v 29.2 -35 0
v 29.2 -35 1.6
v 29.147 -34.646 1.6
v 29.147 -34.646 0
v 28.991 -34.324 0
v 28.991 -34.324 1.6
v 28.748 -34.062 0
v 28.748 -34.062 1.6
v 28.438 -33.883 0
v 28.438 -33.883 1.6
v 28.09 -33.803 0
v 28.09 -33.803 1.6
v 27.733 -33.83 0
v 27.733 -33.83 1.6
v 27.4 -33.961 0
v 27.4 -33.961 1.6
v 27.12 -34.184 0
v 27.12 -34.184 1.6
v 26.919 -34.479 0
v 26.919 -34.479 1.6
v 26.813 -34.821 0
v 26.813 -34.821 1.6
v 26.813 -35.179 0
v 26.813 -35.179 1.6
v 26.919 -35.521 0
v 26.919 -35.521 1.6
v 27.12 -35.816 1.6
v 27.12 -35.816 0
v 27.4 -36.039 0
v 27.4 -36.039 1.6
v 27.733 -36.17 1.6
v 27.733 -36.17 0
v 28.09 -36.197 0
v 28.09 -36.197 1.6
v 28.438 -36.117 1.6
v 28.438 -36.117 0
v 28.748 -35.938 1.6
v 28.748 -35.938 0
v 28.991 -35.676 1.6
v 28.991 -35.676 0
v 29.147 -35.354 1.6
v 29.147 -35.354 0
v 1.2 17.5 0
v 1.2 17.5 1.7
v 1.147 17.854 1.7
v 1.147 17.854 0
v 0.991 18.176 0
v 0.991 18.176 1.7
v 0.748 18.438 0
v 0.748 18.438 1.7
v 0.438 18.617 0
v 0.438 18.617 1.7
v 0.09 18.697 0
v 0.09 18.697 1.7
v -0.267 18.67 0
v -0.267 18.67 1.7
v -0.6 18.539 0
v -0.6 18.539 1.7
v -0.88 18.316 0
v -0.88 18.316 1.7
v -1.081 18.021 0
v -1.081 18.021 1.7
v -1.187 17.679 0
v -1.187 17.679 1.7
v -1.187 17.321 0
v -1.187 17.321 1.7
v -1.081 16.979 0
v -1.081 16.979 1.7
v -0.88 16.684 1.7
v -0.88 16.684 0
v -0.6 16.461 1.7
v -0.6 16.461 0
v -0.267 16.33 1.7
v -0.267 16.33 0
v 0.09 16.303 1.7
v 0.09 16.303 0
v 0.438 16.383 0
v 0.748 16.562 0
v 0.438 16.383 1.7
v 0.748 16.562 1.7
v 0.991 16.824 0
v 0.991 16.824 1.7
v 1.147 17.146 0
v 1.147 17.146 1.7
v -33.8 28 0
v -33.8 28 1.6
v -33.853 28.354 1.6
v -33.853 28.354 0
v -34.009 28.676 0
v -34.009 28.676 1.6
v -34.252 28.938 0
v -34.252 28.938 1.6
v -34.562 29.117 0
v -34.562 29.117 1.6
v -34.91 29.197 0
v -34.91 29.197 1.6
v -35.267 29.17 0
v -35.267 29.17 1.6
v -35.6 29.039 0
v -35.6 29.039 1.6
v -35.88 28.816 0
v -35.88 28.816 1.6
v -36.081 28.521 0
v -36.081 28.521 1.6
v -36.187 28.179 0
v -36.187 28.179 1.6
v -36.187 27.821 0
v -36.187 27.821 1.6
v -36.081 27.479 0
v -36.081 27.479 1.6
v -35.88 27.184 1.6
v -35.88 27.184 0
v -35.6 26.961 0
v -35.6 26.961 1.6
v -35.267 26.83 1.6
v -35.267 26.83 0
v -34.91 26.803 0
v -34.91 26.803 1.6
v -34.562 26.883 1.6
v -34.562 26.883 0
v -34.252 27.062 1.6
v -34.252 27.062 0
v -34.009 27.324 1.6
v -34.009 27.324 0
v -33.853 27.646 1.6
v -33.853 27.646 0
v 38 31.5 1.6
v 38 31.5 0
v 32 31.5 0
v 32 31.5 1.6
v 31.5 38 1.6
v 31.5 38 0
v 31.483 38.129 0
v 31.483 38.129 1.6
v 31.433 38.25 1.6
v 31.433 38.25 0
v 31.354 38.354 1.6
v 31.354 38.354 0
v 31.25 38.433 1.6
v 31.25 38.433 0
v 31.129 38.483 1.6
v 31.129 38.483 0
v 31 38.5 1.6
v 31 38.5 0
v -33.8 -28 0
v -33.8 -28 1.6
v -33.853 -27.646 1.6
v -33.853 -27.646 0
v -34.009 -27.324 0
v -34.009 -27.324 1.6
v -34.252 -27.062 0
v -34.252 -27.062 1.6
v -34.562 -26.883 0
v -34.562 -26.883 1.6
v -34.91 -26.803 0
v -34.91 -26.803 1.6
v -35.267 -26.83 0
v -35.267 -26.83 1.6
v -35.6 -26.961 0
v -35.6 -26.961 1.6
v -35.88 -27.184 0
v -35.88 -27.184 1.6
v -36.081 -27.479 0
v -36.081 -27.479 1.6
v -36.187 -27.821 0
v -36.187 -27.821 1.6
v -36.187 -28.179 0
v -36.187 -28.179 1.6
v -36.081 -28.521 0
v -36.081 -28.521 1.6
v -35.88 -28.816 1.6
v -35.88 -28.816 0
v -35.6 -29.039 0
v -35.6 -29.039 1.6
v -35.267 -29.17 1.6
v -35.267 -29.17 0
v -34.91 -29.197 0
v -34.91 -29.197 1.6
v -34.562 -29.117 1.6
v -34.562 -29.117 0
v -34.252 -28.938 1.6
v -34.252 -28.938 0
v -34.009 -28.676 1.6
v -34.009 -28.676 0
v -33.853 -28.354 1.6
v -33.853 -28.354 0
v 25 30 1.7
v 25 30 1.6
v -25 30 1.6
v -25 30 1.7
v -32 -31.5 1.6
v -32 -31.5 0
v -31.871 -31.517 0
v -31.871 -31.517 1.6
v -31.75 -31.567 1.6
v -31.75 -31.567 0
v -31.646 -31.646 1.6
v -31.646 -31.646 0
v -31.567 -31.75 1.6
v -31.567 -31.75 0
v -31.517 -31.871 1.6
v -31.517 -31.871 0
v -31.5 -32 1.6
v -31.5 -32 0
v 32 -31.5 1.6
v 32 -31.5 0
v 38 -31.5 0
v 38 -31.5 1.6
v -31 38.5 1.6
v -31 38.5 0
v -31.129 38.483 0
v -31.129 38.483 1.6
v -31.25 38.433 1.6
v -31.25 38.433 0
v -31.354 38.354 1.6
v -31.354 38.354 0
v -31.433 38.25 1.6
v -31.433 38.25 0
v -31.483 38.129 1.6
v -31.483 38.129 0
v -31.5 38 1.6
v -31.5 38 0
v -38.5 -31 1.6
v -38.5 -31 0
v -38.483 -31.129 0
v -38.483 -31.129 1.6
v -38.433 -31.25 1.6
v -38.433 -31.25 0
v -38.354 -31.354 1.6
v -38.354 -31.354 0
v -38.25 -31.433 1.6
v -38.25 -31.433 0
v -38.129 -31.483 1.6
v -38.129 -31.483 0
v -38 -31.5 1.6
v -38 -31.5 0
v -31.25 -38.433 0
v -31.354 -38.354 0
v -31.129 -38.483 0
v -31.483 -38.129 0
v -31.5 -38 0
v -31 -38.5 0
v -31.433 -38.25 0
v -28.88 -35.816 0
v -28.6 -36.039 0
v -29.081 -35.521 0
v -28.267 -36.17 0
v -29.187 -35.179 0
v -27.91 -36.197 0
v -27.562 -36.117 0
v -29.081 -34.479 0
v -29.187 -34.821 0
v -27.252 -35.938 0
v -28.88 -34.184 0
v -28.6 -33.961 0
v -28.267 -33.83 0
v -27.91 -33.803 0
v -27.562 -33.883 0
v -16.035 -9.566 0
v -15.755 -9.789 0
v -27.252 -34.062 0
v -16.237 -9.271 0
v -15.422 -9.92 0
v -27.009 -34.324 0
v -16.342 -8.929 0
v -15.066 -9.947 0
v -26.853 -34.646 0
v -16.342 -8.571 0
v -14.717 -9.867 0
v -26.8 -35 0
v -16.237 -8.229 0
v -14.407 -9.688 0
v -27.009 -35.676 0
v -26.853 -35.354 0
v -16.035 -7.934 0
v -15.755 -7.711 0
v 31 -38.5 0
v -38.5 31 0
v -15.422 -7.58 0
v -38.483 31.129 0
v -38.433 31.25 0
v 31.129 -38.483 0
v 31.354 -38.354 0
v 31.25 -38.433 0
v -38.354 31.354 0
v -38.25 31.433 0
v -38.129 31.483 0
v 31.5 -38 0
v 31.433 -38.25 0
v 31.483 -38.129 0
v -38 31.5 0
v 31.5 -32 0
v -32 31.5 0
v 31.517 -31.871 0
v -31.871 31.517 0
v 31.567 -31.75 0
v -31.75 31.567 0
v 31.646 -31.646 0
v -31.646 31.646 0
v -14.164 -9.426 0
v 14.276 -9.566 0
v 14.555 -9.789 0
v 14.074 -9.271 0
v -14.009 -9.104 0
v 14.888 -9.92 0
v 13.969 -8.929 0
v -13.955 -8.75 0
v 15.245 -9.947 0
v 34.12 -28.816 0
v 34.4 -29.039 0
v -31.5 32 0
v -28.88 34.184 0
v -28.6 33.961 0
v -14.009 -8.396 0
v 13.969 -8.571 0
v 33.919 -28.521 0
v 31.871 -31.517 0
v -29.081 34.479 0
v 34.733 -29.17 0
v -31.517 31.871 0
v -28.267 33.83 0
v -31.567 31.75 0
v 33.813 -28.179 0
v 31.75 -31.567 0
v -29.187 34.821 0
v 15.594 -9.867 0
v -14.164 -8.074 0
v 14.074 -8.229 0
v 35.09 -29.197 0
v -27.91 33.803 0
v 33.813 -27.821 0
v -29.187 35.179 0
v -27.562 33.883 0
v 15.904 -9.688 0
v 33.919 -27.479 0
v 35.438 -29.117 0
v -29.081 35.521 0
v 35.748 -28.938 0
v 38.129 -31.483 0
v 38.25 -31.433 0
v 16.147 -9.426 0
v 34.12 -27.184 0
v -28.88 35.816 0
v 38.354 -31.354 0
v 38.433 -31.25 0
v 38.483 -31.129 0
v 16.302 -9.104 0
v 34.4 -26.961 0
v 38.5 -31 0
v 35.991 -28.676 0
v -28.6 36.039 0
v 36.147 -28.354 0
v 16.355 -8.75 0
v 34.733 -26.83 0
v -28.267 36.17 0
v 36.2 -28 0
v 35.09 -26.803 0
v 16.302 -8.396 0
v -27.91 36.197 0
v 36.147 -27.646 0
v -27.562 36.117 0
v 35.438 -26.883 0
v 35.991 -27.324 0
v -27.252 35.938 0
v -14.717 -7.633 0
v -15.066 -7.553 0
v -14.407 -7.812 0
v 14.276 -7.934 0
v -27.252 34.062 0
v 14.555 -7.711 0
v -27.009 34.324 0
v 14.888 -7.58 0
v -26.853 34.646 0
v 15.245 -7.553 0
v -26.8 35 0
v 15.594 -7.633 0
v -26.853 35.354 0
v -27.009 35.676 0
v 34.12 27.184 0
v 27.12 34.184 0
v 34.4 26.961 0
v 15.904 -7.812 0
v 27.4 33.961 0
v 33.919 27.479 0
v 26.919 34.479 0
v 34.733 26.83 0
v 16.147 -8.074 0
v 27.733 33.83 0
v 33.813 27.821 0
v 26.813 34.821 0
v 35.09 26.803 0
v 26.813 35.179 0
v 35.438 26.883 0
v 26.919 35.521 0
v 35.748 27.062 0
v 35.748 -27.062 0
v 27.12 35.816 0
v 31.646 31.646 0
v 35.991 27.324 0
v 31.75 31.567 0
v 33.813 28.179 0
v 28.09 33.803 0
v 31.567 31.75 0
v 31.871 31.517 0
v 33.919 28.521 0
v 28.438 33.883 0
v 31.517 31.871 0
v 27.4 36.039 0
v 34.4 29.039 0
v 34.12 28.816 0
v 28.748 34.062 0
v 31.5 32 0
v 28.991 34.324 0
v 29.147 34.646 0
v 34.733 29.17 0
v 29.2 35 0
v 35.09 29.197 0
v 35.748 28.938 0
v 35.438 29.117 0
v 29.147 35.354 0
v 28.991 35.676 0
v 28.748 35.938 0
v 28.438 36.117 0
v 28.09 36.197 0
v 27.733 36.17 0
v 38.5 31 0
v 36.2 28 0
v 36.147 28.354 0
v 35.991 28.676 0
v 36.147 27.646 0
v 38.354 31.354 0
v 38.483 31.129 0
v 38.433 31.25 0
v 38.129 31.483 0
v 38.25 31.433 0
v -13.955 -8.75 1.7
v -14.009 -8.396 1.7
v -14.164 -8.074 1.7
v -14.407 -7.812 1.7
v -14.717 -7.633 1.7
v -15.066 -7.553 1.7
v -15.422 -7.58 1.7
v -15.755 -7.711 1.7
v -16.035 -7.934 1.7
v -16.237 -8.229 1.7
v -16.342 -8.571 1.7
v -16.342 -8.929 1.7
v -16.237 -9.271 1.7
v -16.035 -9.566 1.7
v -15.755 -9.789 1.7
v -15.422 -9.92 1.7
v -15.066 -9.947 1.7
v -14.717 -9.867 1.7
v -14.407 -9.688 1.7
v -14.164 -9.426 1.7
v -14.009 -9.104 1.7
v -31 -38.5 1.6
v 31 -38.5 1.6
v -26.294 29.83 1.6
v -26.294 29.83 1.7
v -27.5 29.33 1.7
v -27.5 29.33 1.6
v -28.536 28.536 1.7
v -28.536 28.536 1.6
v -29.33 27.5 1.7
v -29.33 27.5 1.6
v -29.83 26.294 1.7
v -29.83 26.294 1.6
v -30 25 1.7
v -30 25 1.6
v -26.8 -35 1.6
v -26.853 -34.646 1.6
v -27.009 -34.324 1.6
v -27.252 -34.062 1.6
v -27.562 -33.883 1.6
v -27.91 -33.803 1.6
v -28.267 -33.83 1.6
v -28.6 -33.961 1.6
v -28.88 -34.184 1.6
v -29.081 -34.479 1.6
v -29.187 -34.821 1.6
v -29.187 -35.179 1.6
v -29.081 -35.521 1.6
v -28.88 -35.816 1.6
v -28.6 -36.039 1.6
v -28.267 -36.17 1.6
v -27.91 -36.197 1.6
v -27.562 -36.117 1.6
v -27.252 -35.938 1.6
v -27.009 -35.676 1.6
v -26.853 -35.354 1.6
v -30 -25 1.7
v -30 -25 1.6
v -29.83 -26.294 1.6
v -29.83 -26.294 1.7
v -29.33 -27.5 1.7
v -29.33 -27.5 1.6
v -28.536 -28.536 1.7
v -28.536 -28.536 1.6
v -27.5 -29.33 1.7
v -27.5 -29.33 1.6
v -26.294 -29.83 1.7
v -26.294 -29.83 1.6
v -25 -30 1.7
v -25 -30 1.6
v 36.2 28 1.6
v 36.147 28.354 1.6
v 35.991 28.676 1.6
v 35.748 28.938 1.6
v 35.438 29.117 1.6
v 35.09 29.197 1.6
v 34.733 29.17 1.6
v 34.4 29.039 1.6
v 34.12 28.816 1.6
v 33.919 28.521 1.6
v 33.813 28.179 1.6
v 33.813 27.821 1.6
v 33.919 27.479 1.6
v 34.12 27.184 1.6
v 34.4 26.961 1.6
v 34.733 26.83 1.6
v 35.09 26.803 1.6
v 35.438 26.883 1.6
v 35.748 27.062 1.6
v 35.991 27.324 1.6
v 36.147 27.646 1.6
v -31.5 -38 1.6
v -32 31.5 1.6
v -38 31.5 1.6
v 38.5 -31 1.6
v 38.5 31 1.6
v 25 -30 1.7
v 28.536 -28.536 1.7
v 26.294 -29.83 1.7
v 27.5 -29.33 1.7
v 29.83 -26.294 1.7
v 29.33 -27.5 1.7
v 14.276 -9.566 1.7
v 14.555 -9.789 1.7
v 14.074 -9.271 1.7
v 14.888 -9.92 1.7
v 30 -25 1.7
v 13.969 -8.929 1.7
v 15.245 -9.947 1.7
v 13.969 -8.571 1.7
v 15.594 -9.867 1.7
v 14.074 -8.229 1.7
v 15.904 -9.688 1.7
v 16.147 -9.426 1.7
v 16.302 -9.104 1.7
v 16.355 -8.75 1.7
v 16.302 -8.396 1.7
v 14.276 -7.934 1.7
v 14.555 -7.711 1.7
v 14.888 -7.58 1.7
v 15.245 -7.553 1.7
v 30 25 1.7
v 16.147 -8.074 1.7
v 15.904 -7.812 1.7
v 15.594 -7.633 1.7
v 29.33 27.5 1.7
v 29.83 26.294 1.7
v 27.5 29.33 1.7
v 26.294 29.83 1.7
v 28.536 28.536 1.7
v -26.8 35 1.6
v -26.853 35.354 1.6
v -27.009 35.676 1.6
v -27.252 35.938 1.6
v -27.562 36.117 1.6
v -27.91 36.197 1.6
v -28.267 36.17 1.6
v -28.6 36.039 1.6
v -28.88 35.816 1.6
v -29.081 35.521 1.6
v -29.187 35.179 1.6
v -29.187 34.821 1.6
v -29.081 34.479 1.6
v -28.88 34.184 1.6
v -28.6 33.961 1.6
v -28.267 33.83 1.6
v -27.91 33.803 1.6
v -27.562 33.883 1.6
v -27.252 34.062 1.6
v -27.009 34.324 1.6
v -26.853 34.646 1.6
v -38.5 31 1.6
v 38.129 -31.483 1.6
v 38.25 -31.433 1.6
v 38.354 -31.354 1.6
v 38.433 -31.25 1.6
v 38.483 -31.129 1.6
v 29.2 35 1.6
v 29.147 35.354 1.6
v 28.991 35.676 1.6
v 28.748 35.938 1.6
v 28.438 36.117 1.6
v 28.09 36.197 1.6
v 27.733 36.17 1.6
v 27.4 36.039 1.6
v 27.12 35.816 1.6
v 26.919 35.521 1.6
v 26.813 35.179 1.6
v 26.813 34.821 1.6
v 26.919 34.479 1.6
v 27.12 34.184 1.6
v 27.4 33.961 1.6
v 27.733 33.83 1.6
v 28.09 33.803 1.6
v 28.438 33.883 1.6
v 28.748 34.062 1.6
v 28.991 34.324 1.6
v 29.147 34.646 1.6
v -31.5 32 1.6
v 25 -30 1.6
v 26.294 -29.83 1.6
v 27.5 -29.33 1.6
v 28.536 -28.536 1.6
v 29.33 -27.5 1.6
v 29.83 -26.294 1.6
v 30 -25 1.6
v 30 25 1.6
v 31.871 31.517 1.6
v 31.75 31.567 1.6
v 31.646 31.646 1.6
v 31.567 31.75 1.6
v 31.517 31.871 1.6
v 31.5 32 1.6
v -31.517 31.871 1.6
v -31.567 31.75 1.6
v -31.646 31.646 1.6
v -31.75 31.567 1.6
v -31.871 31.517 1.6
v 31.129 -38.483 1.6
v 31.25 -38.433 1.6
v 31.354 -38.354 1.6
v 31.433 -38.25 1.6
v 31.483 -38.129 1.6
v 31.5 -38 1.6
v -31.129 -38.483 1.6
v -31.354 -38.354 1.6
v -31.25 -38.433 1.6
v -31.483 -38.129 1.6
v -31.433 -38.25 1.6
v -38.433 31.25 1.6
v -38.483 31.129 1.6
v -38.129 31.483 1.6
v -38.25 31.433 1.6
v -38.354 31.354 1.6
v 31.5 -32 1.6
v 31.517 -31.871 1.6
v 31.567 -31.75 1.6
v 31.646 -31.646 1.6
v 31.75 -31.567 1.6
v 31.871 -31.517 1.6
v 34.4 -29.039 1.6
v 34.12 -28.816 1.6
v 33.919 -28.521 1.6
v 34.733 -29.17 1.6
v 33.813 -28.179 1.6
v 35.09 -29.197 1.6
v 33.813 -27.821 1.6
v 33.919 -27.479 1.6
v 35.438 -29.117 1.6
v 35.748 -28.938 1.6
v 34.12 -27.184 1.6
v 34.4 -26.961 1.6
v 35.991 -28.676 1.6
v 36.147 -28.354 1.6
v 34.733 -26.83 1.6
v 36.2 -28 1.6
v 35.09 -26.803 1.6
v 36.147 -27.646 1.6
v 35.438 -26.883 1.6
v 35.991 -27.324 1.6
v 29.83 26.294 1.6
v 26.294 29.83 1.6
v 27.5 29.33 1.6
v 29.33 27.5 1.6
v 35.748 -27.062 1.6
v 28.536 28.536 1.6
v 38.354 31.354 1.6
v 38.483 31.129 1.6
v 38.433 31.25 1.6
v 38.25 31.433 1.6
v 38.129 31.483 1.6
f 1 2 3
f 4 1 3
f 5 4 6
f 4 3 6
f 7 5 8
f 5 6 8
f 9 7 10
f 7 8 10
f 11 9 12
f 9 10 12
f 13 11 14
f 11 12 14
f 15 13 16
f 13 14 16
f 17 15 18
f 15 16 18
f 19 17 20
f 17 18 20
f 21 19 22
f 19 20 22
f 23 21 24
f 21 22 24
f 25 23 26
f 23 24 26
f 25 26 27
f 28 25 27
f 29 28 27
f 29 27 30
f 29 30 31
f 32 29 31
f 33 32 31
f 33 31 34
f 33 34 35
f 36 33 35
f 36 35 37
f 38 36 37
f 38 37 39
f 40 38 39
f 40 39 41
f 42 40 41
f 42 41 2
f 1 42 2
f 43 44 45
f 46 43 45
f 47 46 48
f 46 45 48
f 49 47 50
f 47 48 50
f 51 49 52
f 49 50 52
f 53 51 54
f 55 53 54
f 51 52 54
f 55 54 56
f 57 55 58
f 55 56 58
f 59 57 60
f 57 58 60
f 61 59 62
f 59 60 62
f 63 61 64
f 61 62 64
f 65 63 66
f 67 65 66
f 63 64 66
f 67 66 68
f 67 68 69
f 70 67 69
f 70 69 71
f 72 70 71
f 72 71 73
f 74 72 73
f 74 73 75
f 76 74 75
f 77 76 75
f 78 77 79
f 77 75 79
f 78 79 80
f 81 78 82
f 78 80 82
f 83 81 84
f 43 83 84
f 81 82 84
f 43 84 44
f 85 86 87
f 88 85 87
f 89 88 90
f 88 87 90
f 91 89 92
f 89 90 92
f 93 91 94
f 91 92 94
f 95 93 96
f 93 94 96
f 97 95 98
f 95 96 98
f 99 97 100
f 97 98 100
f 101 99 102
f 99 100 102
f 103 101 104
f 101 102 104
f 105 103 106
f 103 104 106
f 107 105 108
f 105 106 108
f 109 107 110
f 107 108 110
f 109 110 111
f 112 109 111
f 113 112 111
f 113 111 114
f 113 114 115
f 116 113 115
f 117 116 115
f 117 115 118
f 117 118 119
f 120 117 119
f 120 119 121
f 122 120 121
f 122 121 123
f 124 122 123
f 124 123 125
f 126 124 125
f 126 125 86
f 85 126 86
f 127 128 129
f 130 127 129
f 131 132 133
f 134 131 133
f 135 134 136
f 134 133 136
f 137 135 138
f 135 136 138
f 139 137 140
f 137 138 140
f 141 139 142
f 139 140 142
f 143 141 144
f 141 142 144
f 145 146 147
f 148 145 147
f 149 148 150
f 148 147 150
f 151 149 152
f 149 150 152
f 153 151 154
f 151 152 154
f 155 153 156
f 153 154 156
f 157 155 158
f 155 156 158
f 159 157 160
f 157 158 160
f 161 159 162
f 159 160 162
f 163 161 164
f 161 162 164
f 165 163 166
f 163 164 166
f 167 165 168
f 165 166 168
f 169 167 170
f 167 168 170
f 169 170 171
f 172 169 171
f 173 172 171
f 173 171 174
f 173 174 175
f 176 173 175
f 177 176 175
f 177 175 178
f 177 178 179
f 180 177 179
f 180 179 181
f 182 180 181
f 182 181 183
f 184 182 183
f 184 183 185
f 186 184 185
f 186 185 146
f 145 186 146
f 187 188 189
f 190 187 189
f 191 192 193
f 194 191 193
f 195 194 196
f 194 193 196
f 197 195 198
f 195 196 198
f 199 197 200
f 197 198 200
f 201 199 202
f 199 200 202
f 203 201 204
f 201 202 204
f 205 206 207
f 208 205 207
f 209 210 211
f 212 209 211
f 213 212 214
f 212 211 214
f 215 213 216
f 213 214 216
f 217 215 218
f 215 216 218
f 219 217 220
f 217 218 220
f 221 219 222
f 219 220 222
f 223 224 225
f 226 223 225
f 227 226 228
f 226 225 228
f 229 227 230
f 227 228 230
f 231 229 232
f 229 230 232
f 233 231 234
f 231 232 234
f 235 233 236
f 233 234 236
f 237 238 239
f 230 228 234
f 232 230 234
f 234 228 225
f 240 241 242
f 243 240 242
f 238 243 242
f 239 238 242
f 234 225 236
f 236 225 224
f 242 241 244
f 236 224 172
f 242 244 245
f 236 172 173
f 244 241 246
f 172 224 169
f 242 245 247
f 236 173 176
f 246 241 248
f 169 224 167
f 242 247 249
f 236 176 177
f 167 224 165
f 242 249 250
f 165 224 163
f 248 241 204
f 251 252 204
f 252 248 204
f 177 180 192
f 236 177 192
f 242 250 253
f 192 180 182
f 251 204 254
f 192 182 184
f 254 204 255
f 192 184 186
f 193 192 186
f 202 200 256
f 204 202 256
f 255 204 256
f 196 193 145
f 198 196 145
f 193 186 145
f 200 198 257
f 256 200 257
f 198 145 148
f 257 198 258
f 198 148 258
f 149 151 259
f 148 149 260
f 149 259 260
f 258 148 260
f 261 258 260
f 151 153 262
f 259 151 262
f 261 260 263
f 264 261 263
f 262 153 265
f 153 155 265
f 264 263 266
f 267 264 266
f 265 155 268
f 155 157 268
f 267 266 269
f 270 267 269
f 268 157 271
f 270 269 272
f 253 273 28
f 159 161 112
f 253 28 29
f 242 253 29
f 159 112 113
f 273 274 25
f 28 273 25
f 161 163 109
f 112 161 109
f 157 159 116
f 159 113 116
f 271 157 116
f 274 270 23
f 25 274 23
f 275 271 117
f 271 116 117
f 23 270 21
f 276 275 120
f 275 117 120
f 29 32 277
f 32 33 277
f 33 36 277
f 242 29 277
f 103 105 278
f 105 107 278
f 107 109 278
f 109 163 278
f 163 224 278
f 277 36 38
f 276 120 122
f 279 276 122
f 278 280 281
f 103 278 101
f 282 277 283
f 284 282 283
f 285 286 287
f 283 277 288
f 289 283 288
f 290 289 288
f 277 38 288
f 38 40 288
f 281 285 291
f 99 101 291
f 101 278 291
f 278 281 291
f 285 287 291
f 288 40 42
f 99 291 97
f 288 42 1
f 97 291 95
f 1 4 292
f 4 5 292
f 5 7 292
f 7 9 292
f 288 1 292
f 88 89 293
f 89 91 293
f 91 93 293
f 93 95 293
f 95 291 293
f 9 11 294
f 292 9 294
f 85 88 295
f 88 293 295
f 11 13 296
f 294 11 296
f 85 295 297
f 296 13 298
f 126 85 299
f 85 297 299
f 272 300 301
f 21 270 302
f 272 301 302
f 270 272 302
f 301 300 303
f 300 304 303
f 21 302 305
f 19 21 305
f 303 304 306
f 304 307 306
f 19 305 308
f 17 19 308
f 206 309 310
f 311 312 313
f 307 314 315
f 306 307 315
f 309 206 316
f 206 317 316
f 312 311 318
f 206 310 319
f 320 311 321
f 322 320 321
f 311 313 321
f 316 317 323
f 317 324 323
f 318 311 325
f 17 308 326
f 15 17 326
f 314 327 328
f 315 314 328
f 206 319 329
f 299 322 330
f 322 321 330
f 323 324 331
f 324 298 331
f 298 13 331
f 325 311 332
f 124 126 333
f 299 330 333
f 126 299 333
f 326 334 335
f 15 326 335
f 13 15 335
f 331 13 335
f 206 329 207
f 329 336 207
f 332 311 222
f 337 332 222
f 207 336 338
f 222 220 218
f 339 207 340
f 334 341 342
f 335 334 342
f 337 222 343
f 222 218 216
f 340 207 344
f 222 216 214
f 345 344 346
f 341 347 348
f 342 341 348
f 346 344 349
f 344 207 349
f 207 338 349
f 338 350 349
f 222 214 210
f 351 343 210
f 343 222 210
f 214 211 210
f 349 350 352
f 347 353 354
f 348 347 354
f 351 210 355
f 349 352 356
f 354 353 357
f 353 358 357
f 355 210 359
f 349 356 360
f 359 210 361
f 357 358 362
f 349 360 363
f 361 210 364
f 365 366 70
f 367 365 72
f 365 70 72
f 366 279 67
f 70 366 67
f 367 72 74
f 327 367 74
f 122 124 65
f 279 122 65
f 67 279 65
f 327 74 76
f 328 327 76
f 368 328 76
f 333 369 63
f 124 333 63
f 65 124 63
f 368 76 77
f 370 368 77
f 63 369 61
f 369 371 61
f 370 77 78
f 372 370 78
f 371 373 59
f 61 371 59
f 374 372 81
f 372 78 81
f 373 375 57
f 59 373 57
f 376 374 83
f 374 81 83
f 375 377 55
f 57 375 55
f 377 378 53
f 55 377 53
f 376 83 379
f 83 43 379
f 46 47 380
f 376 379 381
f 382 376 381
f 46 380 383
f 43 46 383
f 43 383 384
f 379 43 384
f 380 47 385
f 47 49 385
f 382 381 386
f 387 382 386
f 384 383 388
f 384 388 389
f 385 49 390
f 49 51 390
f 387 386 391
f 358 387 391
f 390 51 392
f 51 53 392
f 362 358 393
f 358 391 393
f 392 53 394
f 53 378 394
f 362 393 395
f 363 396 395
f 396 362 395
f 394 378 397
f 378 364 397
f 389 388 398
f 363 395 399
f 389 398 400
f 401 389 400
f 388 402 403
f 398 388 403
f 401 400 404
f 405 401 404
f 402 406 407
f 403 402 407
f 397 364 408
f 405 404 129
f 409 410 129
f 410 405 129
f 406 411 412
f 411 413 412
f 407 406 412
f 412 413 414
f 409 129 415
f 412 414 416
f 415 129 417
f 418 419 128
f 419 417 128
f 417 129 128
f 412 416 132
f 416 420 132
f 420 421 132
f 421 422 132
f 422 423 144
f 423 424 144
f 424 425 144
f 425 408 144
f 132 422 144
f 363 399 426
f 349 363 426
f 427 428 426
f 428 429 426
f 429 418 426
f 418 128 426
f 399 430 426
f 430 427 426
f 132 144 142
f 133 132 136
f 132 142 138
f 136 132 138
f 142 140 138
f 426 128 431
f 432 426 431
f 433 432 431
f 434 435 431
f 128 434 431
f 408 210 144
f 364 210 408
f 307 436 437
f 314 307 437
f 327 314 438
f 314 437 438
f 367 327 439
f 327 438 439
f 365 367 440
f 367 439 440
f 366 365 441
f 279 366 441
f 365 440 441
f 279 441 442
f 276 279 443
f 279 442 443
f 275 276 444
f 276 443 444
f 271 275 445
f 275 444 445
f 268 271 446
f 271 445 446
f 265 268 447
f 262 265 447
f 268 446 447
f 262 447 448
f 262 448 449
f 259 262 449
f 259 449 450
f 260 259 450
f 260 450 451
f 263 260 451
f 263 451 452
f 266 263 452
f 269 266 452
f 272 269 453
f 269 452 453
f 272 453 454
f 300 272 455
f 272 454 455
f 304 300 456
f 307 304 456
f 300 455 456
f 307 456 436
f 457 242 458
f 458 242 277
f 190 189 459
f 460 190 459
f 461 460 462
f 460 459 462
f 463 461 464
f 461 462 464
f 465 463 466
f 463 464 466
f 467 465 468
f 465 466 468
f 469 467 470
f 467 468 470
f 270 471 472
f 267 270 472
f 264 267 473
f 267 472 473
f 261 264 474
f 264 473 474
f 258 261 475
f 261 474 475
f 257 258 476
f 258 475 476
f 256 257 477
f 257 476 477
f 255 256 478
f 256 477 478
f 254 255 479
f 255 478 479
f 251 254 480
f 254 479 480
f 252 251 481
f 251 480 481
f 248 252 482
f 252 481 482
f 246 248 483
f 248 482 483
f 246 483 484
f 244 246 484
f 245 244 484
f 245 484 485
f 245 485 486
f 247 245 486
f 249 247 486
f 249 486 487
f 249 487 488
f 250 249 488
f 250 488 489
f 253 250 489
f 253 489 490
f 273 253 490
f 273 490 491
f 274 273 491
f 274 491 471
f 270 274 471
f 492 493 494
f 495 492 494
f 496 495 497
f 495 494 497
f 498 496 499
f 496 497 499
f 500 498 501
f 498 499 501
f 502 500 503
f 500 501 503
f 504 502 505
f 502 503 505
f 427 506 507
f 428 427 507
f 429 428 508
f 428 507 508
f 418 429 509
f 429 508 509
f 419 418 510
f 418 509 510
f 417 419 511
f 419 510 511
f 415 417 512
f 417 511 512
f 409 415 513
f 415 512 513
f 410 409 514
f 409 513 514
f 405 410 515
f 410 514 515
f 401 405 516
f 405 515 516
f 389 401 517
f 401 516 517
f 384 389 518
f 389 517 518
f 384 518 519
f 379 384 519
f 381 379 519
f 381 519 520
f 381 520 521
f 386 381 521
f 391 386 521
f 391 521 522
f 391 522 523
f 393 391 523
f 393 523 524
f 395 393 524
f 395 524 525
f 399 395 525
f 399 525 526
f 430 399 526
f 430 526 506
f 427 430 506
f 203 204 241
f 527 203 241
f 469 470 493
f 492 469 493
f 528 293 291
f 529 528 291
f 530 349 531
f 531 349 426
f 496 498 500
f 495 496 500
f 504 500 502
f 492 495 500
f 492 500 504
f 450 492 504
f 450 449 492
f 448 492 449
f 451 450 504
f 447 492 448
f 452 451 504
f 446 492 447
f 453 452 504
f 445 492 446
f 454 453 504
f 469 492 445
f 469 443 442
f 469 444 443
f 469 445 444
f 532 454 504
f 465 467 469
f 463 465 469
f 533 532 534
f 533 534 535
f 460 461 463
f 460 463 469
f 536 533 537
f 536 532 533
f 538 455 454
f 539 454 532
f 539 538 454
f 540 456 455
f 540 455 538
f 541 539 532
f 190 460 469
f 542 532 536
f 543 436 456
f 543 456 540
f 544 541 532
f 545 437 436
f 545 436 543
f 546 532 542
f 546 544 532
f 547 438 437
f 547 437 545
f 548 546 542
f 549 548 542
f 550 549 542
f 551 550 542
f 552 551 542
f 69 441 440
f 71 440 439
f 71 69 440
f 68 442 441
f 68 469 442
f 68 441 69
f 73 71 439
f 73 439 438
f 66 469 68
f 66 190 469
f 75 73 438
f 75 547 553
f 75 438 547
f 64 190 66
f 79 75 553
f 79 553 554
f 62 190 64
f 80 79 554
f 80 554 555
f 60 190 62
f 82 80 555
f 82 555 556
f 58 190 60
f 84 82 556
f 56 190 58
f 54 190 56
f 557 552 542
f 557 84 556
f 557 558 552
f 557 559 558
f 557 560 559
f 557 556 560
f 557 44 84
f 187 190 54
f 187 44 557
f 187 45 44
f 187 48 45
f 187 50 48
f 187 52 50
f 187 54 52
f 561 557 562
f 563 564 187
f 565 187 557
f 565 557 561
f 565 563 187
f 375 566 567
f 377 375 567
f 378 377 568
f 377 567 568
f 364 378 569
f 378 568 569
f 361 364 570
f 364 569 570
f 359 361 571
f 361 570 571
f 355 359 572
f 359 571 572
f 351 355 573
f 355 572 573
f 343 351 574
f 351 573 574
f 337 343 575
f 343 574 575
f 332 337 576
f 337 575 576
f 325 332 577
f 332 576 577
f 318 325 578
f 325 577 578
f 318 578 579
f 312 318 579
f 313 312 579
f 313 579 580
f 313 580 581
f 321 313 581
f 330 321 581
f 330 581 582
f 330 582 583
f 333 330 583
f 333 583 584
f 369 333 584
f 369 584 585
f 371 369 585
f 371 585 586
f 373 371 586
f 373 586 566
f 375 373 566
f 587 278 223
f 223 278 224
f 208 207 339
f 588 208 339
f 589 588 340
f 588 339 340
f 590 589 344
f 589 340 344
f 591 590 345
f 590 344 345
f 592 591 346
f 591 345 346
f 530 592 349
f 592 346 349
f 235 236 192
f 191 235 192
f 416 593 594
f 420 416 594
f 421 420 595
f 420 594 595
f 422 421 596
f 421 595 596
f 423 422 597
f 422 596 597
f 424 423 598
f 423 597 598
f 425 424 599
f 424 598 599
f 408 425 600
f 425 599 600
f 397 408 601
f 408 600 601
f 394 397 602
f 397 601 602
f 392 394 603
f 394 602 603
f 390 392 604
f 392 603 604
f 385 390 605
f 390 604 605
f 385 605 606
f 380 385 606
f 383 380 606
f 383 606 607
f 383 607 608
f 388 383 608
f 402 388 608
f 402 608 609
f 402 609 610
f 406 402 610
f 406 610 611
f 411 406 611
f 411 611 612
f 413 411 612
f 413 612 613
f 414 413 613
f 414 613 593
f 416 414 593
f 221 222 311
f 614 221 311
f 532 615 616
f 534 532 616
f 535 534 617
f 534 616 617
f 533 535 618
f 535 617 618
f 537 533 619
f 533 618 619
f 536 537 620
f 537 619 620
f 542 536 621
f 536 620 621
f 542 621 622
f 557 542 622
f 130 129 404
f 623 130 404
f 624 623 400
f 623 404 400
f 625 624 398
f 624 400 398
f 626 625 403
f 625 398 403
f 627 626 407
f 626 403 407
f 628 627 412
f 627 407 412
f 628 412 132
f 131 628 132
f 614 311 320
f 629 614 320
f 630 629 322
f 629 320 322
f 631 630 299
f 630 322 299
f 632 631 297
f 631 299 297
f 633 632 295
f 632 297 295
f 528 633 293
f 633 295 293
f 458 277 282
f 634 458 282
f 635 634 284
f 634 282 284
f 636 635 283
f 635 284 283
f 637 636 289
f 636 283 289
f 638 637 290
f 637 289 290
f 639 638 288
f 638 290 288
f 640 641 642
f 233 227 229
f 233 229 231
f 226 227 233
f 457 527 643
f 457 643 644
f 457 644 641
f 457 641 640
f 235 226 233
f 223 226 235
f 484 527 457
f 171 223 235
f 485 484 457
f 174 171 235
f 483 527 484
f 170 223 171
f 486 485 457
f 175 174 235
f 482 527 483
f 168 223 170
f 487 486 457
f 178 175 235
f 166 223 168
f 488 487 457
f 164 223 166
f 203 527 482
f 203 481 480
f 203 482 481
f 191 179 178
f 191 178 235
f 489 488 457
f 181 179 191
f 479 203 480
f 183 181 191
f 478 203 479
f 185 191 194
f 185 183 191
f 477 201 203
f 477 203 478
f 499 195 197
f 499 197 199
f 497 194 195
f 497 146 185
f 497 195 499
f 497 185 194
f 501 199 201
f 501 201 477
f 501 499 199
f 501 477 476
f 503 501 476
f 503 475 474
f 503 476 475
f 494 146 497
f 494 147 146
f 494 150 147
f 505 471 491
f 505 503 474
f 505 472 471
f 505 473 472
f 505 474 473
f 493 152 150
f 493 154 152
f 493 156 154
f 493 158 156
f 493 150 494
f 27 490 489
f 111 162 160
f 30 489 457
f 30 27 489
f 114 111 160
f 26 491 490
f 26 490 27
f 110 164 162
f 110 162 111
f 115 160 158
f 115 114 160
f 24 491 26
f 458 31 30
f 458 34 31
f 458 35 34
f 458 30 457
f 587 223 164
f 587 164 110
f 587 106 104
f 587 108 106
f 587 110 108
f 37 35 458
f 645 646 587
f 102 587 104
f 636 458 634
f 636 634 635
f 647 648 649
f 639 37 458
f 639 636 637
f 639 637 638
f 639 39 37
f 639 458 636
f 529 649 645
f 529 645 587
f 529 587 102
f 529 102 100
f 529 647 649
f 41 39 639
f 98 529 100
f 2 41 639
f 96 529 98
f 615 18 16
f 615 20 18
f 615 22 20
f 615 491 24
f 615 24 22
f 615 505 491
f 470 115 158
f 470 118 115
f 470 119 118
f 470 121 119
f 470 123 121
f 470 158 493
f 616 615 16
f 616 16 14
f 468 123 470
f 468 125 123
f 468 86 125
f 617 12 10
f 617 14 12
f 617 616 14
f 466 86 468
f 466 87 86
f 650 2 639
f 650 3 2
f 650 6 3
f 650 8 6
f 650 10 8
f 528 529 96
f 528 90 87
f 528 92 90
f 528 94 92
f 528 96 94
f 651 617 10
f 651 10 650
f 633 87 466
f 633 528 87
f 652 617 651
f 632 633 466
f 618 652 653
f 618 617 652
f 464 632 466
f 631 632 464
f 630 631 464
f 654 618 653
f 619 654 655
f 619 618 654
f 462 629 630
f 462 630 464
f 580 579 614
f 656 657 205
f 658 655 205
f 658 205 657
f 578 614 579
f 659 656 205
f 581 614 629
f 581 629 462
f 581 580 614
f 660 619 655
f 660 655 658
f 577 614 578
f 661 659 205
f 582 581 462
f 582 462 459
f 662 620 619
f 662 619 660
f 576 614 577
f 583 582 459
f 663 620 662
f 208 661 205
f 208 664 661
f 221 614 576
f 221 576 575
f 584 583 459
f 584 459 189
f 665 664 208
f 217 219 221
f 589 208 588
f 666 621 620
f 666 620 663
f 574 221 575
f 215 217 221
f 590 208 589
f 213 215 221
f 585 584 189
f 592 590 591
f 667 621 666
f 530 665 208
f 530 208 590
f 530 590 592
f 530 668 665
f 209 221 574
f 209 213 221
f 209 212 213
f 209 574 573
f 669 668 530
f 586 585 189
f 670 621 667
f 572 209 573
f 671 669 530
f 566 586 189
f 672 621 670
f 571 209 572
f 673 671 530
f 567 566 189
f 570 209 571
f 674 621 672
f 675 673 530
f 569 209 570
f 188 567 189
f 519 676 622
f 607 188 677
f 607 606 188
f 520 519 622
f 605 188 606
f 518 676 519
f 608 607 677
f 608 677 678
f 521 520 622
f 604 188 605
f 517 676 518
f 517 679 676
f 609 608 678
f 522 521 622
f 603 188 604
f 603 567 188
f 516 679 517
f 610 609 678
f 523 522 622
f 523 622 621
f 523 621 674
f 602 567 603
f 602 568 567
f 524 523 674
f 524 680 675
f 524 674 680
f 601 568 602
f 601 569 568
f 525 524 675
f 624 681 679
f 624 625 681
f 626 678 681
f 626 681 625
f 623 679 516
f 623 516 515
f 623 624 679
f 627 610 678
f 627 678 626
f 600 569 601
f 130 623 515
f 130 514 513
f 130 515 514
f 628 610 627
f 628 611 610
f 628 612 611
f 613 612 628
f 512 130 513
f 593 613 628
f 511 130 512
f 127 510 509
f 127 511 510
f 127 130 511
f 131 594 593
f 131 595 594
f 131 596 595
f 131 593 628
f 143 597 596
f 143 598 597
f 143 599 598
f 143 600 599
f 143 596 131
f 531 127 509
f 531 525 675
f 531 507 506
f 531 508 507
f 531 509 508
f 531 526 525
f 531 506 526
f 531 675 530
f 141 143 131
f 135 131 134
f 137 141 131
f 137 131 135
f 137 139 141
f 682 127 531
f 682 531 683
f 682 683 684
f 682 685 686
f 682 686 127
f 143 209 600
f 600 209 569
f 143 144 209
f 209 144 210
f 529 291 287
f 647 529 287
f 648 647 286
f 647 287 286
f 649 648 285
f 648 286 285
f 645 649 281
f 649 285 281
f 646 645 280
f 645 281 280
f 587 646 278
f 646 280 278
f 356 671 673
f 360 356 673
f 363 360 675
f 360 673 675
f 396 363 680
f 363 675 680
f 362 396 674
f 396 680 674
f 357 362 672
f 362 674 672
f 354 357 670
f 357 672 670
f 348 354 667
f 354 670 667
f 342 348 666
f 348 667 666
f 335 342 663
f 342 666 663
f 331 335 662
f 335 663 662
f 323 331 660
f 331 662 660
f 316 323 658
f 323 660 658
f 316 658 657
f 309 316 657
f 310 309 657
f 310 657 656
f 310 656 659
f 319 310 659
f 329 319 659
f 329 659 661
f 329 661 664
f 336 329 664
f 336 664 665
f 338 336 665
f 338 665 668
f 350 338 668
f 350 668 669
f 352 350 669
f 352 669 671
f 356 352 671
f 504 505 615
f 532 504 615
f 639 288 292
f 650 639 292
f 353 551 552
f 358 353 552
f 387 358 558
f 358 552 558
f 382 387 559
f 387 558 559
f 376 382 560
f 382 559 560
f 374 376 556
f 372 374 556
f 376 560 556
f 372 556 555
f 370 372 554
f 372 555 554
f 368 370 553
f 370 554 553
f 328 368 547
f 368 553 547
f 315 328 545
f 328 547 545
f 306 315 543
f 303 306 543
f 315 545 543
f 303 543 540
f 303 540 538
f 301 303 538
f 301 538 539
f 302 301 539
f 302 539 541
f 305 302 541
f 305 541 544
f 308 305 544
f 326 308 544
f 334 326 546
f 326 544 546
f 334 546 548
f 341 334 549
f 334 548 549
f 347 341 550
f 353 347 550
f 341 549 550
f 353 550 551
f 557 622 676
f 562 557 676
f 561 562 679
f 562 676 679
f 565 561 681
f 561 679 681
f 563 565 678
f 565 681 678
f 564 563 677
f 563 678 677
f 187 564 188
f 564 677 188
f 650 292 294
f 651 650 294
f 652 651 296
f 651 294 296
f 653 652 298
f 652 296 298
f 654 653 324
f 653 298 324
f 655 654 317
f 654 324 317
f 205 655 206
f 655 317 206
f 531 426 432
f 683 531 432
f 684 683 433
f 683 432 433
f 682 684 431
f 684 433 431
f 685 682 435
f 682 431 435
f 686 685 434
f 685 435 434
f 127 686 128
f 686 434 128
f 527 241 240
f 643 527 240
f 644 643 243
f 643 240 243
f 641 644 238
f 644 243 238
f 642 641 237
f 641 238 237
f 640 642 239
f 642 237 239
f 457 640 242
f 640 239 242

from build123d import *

# Parameters (mm, degrees)
BOSS_EXTRUDE1_DEPTH            = 1.6
BOSS_EXTRUDE2_DEPTH            = 0.1
M2_HOLE1_FIXINGSTRUCTURE_D     = 2.4
M2_HOLE1_FIXINGSTRUCTURE_DEPTH = 200
M2_HOLE1_FIXINGSTRUCTURE_TIP   = 0.721032743
SKETCH4_R                      = 1.2
CUT_EXTRUDE1_DEPTH             = 1.7


with BuildPart() as part:
    # Sketch1 → Boss-Extrude1 (new body)
    with BuildSketch(Plane.XY):
        with BuildLine():
            Line((-31.5, 38), (-31.5, 32))
            ThreePointArc((-31.5, 32), (-31.646446609, 31.646446609), (-32, 31.5))
            Line((-32, 31.5), (-38, 31.5))
            ThreePointArc((-38, 31.5), (-38.353553391, 31.353553391), (-38.5, 31))
            Line((-38.5, 31), (-38.5, -31))
            ThreePointArc((-38.5, -31), (-38.353553391, -31.353553391), (-38, -31.5))
            Line((-38, -31.5), (-32, -31.5))
            ThreePointArc((-32, -31.5), (-31.646446609, -31.646446609), (-31.5, -32))
            Line((-31.5, -32), (-31.5, -38))
            ThreePointArc((-31.5, -38), (-31.353553391, -38.353553391), (-31, -38.5))
            Line((-31, -38.5), (31, -38.5))
            ThreePointArc((31, -38.5), (31.353553391, -38.353553391), (31.5, -38))
            Line((31.5, -38), (31.5, -32))
            ThreePointArc((31.5, -32), (31.646446609, -31.646446609), (32, -31.5))
            Line((32, -31.5), (38, -31.5))
            ThreePointArc((38, -31.5), (38.353553391, -31.353553391), (38.5, -31))
            Line((38.5, -31), (38.5, 31))
            ThreePointArc((38.5, 31), (38.353553391, 31.353553391), (38, 31.5))
            Line((38, 31.5), (32, 31.5))
            ThreePointArc((32, 31.5), (31.646446609, 31.646446609), (31.5, 32))
            Line((31.5, 32), (31.5, 38))
            ThreePointArc((31.5, 38), (31.353553391, 38.353553391), (31, 38.5))
            Line((31, 38.5), (-31, 38.5))
            ThreePointArc((-31, 38.5), (-31.353553391, 38.353553391), (-31.5, 38))
        make_face()
    extrude(amount=BOSS_EXTRUDE1_DEPTH)

    # Esboço1 → Boss-Extrude2 (add)
    with BuildSketch(Plane.XY.offset(1.6)):
        with BuildLine():
            Line((-25, -30), (25, -30))
            ThreePointArc((25, -30), (28.535533906, -28.535533906), (30, -25))
            Line((30, -25), (30, 25))
            ThreePointArc((30, 25), (28.535533906, 28.535533906), (25, 30))
            Line((25, 30), (-25, 30))
            ThreePointArc((-25, 30), (-28.535533906, 28.535533906), (-30, 25))
            Line((-30, 25), (-30, -25))
            ThreePointArc((-30, -25), (-28.535533906, -28.535533906), (-25, -30))
        make_face()
    extrude(amount=BOSS_EXTRUDE2_DEPTH)

    # M2 Hole1-FixingStructure
    with Locations(Plane(origin=(0, 0, 0), x_dir=(-1, 0, 0), z_dir=(0, 0, -1))):
        with Locations((-28, 35), (28, 35), (-28, -35), (28, -35), (35, 28), (35, -28), (-35, -28), (-35, 28)):
            Hole(M2_HOLE1_FIXINGSTRUCTURE_D / 2, depth=M2_HOLE1_FIXINGSTRUCTURE_DEPTH)
            with Locations((0, 0, -(M2_HOLE1_FIXINGSTRUCTURE_DEPTH + M2_HOLE1_FIXINGSTRUCTURE_TIP / 2))):  # 118° drill point
                Cone(0, M2_HOLE1_FIXINGSTRUCTURE_D / 2, M2_HOLE1_FIXINGSTRUCTURE_TIP, mode=Mode.SUBTRACT)

    # Sketch4 → Cut-Extrude1 (cut)
    with BuildSketch(Plane.XY.offset(1.7)):
        with Locations((-15.155444566, -8.75)):
            Circle(SKETCH4_R)
        with Locations((15.155444566, -8.75)):
            Circle(SKETCH4_R)
        with Locations((0, 17.5)):
            Circle(SKETCH4_R)
    extrude(amount=-CUT_EXTRUDE1_DEPTH, mode=Mode.SUBTRACT)


solid = part.part
